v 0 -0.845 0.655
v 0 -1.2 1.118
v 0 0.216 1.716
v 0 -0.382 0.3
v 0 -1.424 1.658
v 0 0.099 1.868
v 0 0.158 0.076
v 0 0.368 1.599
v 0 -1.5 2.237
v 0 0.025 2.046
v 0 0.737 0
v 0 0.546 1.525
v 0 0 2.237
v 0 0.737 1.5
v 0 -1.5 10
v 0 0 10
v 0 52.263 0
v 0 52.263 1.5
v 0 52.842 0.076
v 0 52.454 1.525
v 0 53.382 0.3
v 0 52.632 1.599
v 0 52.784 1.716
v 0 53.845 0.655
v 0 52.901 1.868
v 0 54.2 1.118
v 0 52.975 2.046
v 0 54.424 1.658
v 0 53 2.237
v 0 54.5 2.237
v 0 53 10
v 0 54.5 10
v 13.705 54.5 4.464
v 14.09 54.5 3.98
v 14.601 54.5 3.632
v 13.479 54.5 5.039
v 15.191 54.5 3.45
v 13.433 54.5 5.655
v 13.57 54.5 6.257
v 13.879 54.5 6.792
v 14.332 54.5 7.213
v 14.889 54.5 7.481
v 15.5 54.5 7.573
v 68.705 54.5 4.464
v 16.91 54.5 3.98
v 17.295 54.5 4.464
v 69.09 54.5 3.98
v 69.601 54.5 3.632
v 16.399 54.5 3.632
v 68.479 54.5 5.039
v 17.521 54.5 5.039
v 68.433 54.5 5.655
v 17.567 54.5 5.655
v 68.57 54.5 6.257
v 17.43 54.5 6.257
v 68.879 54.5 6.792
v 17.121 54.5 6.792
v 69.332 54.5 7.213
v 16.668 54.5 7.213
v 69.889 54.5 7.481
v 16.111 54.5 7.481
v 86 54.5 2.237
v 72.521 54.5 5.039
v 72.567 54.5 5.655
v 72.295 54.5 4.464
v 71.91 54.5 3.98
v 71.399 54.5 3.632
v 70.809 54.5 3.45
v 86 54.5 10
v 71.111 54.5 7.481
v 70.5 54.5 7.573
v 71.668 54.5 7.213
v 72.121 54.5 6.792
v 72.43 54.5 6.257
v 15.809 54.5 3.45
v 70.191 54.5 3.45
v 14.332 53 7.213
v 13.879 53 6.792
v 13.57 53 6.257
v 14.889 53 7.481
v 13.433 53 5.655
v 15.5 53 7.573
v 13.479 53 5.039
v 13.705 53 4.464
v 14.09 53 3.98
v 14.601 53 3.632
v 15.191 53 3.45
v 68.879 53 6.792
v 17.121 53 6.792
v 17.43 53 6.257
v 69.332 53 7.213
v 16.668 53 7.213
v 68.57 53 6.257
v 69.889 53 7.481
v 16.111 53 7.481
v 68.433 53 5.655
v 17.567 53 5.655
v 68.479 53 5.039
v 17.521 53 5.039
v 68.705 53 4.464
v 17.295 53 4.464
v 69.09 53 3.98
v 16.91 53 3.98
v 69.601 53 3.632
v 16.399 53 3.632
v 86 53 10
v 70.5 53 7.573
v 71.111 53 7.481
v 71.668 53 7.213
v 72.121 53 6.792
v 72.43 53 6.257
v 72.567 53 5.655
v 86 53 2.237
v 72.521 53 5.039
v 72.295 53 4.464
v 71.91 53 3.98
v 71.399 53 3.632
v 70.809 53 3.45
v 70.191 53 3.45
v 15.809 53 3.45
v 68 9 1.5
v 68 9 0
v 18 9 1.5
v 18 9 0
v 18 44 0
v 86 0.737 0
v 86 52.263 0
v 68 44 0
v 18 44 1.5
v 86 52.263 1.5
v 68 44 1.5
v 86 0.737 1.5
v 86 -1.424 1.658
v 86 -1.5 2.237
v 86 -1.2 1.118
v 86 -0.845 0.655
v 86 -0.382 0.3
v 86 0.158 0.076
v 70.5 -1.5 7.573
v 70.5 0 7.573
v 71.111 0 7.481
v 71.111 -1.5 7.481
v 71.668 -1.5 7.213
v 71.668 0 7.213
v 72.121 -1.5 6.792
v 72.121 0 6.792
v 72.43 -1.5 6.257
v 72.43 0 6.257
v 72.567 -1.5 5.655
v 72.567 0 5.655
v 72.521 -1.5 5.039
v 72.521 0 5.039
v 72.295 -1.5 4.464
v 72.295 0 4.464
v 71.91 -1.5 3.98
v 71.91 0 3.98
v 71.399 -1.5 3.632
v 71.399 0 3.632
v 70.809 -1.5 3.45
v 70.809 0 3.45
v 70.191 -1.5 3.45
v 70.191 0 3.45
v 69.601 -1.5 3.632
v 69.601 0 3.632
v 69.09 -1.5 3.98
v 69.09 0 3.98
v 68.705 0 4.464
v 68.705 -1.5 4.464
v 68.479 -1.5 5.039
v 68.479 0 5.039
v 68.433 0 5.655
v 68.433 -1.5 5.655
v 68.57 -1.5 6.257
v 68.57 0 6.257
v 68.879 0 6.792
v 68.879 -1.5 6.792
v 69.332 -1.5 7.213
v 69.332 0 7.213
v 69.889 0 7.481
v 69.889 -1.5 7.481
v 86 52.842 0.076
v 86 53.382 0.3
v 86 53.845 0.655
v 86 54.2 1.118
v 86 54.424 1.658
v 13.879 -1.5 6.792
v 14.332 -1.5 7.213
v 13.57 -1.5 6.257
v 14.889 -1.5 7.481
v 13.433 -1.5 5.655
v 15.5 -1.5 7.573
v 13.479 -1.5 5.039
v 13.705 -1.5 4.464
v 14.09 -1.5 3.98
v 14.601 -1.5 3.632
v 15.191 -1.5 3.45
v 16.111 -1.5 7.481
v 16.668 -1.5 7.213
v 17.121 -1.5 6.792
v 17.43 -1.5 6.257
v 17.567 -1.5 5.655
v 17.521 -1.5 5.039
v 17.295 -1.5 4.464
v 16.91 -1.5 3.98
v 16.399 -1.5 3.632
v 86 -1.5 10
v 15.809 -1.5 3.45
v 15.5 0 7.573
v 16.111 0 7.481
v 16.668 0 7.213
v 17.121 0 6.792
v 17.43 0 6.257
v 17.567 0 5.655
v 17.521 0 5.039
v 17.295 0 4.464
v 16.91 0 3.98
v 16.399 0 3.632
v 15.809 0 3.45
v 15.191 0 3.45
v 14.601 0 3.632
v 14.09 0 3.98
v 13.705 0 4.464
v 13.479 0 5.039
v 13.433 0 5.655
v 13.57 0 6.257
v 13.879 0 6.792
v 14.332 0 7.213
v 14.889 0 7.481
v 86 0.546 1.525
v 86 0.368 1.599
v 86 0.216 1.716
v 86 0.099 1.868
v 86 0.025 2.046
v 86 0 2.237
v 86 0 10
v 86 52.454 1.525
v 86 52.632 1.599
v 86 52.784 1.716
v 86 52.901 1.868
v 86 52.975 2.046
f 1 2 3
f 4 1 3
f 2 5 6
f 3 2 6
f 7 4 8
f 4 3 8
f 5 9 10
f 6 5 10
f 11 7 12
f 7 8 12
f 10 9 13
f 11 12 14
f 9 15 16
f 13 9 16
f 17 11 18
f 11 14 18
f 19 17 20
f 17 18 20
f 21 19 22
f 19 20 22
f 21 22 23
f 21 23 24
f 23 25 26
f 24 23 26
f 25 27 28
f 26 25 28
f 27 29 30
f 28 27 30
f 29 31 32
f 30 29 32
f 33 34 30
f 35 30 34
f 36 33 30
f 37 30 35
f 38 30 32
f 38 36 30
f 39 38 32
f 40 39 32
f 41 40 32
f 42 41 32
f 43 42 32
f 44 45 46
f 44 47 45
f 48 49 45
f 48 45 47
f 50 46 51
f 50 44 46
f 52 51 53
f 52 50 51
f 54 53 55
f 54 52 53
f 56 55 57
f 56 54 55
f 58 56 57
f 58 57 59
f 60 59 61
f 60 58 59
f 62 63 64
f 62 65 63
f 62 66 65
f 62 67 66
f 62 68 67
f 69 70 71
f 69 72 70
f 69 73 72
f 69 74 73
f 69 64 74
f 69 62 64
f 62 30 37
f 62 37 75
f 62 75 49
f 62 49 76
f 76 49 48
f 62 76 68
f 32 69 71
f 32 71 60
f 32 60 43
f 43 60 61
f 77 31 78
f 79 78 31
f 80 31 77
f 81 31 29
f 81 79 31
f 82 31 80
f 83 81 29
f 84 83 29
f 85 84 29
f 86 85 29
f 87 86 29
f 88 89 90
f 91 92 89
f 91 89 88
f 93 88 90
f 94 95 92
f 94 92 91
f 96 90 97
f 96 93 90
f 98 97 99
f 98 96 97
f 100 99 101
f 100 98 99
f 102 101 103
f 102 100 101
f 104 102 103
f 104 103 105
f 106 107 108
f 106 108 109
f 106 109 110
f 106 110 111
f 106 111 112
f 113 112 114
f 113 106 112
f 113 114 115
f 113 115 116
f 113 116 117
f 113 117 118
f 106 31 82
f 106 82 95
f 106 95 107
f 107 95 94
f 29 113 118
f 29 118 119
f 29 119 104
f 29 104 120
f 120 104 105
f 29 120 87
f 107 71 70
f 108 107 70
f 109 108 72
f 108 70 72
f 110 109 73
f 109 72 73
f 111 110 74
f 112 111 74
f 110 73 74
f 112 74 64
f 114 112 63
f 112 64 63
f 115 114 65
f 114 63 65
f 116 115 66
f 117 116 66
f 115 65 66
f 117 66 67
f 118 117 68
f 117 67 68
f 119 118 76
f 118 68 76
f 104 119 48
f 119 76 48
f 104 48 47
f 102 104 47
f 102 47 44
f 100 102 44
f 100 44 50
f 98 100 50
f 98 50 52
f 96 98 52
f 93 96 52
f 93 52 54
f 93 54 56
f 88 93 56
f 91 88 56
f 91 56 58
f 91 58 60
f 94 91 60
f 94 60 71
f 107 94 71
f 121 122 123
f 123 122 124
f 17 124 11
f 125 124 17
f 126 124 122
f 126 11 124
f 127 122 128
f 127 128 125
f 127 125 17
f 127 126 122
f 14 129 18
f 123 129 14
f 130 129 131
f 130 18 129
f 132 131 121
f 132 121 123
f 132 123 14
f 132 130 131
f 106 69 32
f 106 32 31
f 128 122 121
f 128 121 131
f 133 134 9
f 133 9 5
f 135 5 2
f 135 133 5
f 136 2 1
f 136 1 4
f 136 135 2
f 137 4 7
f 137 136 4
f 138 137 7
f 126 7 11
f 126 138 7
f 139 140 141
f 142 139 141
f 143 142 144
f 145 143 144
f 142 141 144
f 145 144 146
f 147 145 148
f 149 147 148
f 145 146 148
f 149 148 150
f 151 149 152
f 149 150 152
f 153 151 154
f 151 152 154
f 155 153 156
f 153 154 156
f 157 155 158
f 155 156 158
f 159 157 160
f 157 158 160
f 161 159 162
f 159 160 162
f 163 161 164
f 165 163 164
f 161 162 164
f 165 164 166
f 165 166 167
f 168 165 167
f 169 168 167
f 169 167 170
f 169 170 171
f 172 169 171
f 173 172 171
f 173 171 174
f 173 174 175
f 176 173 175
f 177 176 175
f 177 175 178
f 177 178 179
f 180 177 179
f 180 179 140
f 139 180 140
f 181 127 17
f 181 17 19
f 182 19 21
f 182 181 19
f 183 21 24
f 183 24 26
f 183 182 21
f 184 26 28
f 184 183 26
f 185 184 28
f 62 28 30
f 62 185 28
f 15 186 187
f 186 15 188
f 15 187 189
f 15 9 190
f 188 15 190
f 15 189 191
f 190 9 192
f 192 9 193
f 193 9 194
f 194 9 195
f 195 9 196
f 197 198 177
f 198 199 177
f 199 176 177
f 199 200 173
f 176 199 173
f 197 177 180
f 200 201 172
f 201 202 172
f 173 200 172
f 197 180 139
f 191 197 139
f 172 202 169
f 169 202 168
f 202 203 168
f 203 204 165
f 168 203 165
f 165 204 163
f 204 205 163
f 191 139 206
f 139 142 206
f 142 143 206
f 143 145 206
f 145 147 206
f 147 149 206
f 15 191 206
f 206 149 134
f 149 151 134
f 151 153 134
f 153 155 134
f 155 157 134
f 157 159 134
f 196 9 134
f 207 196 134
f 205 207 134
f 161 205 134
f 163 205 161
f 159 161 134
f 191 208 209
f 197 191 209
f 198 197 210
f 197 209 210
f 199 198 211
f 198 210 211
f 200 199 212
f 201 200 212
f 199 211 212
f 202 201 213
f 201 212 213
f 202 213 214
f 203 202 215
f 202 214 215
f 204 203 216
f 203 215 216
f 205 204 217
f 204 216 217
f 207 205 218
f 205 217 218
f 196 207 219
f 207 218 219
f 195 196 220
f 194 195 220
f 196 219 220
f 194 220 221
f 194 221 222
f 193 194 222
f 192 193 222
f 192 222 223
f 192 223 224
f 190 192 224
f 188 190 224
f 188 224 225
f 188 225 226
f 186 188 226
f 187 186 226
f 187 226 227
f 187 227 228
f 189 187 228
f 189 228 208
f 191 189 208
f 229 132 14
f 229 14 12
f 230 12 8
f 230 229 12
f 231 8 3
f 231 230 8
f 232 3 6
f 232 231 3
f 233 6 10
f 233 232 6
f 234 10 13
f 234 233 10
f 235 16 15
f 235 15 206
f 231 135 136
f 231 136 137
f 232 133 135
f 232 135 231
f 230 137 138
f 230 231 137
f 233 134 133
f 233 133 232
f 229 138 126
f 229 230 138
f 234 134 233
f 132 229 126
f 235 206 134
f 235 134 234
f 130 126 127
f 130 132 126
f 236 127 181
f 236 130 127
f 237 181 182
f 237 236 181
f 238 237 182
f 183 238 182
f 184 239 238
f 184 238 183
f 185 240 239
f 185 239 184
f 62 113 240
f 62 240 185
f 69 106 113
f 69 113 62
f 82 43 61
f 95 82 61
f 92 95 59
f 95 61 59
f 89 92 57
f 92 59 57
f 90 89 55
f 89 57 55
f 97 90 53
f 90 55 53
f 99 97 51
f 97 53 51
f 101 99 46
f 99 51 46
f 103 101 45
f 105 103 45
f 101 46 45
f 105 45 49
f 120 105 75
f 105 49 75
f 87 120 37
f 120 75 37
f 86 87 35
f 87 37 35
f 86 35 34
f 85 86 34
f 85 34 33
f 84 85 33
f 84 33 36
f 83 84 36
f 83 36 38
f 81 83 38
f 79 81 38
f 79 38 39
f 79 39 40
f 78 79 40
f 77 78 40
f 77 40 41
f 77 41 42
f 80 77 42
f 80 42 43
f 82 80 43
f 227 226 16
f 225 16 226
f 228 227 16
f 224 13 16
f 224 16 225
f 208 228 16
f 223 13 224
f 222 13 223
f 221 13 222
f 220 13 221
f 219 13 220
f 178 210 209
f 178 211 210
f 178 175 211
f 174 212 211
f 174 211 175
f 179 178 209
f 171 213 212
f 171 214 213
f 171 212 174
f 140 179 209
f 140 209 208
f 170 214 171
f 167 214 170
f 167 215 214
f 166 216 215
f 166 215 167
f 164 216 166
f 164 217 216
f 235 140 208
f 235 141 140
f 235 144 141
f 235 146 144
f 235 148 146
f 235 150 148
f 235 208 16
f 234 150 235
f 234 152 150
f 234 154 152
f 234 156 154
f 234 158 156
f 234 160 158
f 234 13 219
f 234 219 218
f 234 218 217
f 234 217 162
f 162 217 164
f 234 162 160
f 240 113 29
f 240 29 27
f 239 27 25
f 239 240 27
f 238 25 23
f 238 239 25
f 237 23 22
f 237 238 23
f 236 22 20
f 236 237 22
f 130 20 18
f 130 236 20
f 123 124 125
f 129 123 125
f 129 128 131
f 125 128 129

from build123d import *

# Parameters (mm, degrees)
SKETCH_2_W                       = 86
SKETCH_2_H                       = 1.5
SM_BASE_FLANGE_1_DEPTH           = 10
SM_EDGE_FLANGE_1_STRIP_W         = 7.4732
SM_EDGE_FLANGE_1_STRIP_H         = 1.5
SM_EDGE_FLANGE_1_STRIP_CUT_DEPTH = 86
SM_EDGE_FLANGE_1_DEPTH           = 86
SM_EDGE_FLANGE_2_STRIP_W         = 7.4732
SM_EDGE_FLANGE_2_STRIP_H         = 1.5
SM_EDGE_FLANGE_2_STRIP_CUT_DEPTH = 86
SM_EDGE_FLANGE_2_DEPTH           = 86
SKETCH_13_W                      = 50
SKETCH_13_H                      = 35
CUT_EXTRUDE_1_DEPTH              = 10
SKETCH_14_R                      = 2.072907101
CUT_EXTRUDE_2_DEPTH              = 104.111590037


# Sheet-metal steps are written as plain solids
with BuildPart() as part:
    # Sketch 2 → 基体-法兰1 (new body)
    with BuildSketch(Plane.XY):
        with Locations((43, -0.75)):
            Rectangle(SKETCH_2_W, SKETCH_2_H)
    extrude(amount=SM_BASE_FLANGE_1_DEPTH)

    # 边线-法兰1 strip (across the edge) → 边线-法兰1 strip cut (cut)
    with BuildSketch(Plane.ZY.offset(-86)):
        with Locations((-1.5, -0.75)):
            Rectangle(SM_EDGE_FLANGE_1_STRIP_W, SM_EDGE_FLANGE_1_STRIP_H)
    extrude(amount=SM_EDGE_FLANGE_1_STRIP_CUT_DEPTH, mode=Mode.SUBTRACT)

    # 边线-法兰1 section (across the edge) → 边线-法兰1 (add)
    with BuildSketch(Plane.ZY.offset(-86)):
        with BuildLine():
            Line((0, 0.7366), (0, 54.5))
            Line((0, 54.5), (1.5, 54.5))
            Line((1.5, 54.5), (1.5, 0.7366))
            ThreePointArc((1.5, 0.7366), (1.715745145, 0.215745145), (2.2366, 0))
            Line((2.2366, 0), (2.2366, -1.5))
            ThreePointArc((2.2366, -1.5), (0.655084973, -0.844915027), (0, 0.7366))
        make_face()
    extrude(amount=SM_EDGE_FLANGE_1_DEPTH)

    # 边线-法兰2 strip (across the edge) → 边线-法兰2 strip cut (cut)
    with BuildSketch(Plane(origin=(86, 54.5, 1.5), x_dir=(0, -1, 0), z_dir=(-1, 0, 0))):
        with Locations((-1.5, -0.75)):
            Rectangle(SM_EDGE_FLANGE_2_STRIP_W, SM_EDGE_FLANGE_2_STRIP_H)
    extrude(amount=SM_EDGE_FLANGE_2_STRIP_CUT_DEPTH, mode=Mode.SUBTRACT)

    # 边线-法兰2 section (across the edge) → 边线-法兰2 (add)
    with BuildSketch(Plane(origin=(86, 54.5, 1.5), x_dir=(0, -1, 0), z_dir=(-1, 0, 0))):
        with BuildLine():
            Line((0, 0.7366), (0, 8.5))
            Line((0, 8.5), (1.5, 8.5))
            Line((1.5, 8.5), (1.5, 0.7366))
            ThreePointArc((1.5, 0.7366), (1.715745145, 0.215745145), (2.2366, 0))
            Line((2.2366, 0), (2.2366, -1.5))
            ThreePointArc((2.2366, -1.5), (0.655084973, -0.844915027), (0, 0.7366))
        make_face()
    extrude(amount=SM_EDGE_FLANGE_2_DEPTH)

    # 草图13 → 切除-拉伸1 (cut)
    with BuildSketch(Plane(origin=(0, 0, 0), x_dir=(-1, 0, 0), z_dir=(0, 0, -1))):
        with Locations((-43, 26.5)):
            Rectangle(SKETCH_13_W, SKETCH_13_H)
    extrude(amount=-CUT_EXTRUDE_1_DEPTH, mode=Mode.SUBTRACT)

    # 草图14 → 切除-拉伸2 (cut, through all)
    with BuildSketch(Plane(origin=(0, 54.5, 0), x_dir=(1, 0, 0), z_dir=(0, 1, 0))):
        with Locations(Location((15.5, -5.5, 0), (0, 0, 270))):
            Circle(SKETCH_14_R)
        with Locations(Location((70.5, -5.5, 0), (0, 0, 270))):
            Circle(SKETCH_14_R)
    extrude(amount=-CUT_EXTRUDE_2_DEPTH, mode=Mode.SUBTRACT)


solid = part.part
